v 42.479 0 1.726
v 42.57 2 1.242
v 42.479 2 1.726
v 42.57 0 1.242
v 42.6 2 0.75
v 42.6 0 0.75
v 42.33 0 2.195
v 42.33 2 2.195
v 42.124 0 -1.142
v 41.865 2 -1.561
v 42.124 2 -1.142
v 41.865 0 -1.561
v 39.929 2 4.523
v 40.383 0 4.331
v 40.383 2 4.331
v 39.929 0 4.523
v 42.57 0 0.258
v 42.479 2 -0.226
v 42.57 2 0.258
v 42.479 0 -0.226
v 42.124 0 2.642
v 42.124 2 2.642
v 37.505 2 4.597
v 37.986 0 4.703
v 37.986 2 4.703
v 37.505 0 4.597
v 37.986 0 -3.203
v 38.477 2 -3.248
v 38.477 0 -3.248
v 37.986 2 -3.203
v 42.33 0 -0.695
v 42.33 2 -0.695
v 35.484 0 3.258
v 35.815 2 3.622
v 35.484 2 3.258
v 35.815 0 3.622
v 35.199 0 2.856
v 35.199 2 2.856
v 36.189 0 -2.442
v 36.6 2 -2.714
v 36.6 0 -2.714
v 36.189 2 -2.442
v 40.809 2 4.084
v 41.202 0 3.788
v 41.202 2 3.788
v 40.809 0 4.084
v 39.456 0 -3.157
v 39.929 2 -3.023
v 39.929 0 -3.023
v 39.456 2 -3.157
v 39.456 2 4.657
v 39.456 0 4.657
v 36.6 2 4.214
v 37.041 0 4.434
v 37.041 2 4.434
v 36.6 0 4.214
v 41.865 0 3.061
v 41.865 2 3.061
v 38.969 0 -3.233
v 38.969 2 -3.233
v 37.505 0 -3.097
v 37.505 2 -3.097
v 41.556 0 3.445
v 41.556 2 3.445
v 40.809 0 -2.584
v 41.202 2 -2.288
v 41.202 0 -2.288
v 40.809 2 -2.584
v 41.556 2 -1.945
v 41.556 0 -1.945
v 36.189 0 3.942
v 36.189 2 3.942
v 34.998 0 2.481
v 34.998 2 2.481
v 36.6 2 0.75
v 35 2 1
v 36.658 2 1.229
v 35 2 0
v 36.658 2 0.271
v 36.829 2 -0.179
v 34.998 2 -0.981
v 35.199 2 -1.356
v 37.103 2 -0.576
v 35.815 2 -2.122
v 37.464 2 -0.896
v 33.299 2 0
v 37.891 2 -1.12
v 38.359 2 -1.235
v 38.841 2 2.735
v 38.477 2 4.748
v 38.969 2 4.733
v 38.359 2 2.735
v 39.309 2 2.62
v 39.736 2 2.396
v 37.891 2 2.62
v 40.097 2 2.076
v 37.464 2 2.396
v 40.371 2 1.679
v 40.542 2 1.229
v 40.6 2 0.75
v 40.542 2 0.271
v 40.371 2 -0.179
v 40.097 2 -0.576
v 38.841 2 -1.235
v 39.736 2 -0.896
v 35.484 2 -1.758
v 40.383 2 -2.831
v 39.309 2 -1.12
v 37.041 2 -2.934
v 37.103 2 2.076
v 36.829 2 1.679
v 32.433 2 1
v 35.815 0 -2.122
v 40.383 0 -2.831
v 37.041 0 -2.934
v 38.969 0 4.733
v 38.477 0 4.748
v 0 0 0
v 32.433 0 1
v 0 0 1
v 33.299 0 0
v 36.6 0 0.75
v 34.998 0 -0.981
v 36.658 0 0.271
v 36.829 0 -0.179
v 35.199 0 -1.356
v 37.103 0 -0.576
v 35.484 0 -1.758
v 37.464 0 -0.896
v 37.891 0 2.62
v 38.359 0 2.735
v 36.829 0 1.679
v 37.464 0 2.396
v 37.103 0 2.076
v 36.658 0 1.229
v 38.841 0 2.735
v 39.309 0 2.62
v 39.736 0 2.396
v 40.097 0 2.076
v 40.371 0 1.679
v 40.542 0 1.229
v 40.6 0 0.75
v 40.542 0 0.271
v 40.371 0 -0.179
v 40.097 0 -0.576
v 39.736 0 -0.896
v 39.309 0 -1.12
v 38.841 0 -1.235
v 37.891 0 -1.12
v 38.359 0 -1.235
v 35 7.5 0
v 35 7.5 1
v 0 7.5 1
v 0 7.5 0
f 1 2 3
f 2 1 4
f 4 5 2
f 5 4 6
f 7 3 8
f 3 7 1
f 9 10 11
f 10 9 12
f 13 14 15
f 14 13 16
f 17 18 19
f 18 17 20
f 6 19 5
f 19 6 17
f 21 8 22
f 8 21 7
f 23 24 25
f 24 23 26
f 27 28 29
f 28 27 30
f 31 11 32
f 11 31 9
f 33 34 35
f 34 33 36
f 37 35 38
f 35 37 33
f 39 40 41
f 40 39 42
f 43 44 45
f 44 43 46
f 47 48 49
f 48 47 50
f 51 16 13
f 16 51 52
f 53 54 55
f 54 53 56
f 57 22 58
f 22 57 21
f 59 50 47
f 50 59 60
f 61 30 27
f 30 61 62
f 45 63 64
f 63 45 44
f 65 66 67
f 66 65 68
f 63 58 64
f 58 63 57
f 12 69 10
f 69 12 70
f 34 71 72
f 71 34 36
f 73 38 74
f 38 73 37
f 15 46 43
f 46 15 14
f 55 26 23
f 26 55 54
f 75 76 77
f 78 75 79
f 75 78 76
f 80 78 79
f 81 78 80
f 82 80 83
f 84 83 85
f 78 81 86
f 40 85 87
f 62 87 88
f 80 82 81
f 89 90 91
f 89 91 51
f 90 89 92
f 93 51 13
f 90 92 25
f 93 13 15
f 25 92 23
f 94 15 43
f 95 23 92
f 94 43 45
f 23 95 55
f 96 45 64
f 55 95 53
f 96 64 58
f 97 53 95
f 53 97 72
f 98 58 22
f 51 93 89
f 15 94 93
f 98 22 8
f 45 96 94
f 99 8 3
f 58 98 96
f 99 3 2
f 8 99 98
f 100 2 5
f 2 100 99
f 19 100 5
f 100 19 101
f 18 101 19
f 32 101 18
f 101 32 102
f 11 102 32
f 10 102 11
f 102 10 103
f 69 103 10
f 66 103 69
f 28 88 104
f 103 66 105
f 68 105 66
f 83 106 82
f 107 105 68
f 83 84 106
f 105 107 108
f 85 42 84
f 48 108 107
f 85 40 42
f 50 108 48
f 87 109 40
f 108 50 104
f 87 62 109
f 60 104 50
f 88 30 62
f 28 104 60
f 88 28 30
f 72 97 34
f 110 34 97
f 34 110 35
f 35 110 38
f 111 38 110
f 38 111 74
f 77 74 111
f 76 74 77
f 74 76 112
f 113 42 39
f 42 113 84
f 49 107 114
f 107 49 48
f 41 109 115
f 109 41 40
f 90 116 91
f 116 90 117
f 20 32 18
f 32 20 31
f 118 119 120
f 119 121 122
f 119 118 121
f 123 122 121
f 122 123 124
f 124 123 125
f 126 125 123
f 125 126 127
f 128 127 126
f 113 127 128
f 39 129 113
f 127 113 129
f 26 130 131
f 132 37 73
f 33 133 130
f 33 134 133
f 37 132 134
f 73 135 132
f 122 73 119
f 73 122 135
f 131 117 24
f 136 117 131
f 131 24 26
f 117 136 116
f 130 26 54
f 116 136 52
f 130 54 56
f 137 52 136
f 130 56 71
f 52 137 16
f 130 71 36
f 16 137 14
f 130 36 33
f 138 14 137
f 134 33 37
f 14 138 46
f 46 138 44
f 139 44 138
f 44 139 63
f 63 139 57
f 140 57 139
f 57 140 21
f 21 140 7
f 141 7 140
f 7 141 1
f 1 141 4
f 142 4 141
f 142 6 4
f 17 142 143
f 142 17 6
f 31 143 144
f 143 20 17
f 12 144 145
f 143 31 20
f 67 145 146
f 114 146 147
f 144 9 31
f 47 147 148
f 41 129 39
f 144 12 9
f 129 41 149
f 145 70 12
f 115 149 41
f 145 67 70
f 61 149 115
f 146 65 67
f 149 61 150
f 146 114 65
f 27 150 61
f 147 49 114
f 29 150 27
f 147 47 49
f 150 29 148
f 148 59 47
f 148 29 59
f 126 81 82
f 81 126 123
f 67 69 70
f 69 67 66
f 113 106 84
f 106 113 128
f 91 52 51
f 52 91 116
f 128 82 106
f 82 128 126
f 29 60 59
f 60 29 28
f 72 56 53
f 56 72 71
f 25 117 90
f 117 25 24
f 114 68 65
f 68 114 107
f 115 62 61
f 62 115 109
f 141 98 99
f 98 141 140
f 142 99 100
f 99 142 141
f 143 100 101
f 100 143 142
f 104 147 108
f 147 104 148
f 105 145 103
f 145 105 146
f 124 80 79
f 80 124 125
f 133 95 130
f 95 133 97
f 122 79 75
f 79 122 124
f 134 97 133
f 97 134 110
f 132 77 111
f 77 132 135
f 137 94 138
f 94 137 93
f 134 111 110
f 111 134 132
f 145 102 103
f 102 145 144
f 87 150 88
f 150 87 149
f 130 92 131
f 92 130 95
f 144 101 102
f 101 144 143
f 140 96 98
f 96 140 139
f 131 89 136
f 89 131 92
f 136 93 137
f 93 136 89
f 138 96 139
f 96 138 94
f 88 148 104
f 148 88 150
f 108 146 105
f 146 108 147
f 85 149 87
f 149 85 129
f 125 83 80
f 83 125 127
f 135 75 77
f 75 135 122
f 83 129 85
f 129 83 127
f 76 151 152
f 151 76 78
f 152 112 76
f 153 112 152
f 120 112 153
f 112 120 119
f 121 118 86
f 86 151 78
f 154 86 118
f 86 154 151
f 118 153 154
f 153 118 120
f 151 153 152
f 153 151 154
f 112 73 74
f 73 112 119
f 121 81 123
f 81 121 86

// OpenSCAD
hole = 5;
cube([40 - hole, 7.5,1]);
translate([38.6, 2 , 0.75]) rotate([90, 0, 0]) {
    difference() {
        cylinder(h=2, r=4, $fa = 0.5, $fs = 0.5);
        translate([0, 0, -1]) cylinder(h=6, r=2, $fa = 0.5, $fs = 0.5);
    }
}
translate([35, 2, 0.75]) rotate([90, 180, 0]) linear_extrude(2) 
circle(3,$fn=3);
